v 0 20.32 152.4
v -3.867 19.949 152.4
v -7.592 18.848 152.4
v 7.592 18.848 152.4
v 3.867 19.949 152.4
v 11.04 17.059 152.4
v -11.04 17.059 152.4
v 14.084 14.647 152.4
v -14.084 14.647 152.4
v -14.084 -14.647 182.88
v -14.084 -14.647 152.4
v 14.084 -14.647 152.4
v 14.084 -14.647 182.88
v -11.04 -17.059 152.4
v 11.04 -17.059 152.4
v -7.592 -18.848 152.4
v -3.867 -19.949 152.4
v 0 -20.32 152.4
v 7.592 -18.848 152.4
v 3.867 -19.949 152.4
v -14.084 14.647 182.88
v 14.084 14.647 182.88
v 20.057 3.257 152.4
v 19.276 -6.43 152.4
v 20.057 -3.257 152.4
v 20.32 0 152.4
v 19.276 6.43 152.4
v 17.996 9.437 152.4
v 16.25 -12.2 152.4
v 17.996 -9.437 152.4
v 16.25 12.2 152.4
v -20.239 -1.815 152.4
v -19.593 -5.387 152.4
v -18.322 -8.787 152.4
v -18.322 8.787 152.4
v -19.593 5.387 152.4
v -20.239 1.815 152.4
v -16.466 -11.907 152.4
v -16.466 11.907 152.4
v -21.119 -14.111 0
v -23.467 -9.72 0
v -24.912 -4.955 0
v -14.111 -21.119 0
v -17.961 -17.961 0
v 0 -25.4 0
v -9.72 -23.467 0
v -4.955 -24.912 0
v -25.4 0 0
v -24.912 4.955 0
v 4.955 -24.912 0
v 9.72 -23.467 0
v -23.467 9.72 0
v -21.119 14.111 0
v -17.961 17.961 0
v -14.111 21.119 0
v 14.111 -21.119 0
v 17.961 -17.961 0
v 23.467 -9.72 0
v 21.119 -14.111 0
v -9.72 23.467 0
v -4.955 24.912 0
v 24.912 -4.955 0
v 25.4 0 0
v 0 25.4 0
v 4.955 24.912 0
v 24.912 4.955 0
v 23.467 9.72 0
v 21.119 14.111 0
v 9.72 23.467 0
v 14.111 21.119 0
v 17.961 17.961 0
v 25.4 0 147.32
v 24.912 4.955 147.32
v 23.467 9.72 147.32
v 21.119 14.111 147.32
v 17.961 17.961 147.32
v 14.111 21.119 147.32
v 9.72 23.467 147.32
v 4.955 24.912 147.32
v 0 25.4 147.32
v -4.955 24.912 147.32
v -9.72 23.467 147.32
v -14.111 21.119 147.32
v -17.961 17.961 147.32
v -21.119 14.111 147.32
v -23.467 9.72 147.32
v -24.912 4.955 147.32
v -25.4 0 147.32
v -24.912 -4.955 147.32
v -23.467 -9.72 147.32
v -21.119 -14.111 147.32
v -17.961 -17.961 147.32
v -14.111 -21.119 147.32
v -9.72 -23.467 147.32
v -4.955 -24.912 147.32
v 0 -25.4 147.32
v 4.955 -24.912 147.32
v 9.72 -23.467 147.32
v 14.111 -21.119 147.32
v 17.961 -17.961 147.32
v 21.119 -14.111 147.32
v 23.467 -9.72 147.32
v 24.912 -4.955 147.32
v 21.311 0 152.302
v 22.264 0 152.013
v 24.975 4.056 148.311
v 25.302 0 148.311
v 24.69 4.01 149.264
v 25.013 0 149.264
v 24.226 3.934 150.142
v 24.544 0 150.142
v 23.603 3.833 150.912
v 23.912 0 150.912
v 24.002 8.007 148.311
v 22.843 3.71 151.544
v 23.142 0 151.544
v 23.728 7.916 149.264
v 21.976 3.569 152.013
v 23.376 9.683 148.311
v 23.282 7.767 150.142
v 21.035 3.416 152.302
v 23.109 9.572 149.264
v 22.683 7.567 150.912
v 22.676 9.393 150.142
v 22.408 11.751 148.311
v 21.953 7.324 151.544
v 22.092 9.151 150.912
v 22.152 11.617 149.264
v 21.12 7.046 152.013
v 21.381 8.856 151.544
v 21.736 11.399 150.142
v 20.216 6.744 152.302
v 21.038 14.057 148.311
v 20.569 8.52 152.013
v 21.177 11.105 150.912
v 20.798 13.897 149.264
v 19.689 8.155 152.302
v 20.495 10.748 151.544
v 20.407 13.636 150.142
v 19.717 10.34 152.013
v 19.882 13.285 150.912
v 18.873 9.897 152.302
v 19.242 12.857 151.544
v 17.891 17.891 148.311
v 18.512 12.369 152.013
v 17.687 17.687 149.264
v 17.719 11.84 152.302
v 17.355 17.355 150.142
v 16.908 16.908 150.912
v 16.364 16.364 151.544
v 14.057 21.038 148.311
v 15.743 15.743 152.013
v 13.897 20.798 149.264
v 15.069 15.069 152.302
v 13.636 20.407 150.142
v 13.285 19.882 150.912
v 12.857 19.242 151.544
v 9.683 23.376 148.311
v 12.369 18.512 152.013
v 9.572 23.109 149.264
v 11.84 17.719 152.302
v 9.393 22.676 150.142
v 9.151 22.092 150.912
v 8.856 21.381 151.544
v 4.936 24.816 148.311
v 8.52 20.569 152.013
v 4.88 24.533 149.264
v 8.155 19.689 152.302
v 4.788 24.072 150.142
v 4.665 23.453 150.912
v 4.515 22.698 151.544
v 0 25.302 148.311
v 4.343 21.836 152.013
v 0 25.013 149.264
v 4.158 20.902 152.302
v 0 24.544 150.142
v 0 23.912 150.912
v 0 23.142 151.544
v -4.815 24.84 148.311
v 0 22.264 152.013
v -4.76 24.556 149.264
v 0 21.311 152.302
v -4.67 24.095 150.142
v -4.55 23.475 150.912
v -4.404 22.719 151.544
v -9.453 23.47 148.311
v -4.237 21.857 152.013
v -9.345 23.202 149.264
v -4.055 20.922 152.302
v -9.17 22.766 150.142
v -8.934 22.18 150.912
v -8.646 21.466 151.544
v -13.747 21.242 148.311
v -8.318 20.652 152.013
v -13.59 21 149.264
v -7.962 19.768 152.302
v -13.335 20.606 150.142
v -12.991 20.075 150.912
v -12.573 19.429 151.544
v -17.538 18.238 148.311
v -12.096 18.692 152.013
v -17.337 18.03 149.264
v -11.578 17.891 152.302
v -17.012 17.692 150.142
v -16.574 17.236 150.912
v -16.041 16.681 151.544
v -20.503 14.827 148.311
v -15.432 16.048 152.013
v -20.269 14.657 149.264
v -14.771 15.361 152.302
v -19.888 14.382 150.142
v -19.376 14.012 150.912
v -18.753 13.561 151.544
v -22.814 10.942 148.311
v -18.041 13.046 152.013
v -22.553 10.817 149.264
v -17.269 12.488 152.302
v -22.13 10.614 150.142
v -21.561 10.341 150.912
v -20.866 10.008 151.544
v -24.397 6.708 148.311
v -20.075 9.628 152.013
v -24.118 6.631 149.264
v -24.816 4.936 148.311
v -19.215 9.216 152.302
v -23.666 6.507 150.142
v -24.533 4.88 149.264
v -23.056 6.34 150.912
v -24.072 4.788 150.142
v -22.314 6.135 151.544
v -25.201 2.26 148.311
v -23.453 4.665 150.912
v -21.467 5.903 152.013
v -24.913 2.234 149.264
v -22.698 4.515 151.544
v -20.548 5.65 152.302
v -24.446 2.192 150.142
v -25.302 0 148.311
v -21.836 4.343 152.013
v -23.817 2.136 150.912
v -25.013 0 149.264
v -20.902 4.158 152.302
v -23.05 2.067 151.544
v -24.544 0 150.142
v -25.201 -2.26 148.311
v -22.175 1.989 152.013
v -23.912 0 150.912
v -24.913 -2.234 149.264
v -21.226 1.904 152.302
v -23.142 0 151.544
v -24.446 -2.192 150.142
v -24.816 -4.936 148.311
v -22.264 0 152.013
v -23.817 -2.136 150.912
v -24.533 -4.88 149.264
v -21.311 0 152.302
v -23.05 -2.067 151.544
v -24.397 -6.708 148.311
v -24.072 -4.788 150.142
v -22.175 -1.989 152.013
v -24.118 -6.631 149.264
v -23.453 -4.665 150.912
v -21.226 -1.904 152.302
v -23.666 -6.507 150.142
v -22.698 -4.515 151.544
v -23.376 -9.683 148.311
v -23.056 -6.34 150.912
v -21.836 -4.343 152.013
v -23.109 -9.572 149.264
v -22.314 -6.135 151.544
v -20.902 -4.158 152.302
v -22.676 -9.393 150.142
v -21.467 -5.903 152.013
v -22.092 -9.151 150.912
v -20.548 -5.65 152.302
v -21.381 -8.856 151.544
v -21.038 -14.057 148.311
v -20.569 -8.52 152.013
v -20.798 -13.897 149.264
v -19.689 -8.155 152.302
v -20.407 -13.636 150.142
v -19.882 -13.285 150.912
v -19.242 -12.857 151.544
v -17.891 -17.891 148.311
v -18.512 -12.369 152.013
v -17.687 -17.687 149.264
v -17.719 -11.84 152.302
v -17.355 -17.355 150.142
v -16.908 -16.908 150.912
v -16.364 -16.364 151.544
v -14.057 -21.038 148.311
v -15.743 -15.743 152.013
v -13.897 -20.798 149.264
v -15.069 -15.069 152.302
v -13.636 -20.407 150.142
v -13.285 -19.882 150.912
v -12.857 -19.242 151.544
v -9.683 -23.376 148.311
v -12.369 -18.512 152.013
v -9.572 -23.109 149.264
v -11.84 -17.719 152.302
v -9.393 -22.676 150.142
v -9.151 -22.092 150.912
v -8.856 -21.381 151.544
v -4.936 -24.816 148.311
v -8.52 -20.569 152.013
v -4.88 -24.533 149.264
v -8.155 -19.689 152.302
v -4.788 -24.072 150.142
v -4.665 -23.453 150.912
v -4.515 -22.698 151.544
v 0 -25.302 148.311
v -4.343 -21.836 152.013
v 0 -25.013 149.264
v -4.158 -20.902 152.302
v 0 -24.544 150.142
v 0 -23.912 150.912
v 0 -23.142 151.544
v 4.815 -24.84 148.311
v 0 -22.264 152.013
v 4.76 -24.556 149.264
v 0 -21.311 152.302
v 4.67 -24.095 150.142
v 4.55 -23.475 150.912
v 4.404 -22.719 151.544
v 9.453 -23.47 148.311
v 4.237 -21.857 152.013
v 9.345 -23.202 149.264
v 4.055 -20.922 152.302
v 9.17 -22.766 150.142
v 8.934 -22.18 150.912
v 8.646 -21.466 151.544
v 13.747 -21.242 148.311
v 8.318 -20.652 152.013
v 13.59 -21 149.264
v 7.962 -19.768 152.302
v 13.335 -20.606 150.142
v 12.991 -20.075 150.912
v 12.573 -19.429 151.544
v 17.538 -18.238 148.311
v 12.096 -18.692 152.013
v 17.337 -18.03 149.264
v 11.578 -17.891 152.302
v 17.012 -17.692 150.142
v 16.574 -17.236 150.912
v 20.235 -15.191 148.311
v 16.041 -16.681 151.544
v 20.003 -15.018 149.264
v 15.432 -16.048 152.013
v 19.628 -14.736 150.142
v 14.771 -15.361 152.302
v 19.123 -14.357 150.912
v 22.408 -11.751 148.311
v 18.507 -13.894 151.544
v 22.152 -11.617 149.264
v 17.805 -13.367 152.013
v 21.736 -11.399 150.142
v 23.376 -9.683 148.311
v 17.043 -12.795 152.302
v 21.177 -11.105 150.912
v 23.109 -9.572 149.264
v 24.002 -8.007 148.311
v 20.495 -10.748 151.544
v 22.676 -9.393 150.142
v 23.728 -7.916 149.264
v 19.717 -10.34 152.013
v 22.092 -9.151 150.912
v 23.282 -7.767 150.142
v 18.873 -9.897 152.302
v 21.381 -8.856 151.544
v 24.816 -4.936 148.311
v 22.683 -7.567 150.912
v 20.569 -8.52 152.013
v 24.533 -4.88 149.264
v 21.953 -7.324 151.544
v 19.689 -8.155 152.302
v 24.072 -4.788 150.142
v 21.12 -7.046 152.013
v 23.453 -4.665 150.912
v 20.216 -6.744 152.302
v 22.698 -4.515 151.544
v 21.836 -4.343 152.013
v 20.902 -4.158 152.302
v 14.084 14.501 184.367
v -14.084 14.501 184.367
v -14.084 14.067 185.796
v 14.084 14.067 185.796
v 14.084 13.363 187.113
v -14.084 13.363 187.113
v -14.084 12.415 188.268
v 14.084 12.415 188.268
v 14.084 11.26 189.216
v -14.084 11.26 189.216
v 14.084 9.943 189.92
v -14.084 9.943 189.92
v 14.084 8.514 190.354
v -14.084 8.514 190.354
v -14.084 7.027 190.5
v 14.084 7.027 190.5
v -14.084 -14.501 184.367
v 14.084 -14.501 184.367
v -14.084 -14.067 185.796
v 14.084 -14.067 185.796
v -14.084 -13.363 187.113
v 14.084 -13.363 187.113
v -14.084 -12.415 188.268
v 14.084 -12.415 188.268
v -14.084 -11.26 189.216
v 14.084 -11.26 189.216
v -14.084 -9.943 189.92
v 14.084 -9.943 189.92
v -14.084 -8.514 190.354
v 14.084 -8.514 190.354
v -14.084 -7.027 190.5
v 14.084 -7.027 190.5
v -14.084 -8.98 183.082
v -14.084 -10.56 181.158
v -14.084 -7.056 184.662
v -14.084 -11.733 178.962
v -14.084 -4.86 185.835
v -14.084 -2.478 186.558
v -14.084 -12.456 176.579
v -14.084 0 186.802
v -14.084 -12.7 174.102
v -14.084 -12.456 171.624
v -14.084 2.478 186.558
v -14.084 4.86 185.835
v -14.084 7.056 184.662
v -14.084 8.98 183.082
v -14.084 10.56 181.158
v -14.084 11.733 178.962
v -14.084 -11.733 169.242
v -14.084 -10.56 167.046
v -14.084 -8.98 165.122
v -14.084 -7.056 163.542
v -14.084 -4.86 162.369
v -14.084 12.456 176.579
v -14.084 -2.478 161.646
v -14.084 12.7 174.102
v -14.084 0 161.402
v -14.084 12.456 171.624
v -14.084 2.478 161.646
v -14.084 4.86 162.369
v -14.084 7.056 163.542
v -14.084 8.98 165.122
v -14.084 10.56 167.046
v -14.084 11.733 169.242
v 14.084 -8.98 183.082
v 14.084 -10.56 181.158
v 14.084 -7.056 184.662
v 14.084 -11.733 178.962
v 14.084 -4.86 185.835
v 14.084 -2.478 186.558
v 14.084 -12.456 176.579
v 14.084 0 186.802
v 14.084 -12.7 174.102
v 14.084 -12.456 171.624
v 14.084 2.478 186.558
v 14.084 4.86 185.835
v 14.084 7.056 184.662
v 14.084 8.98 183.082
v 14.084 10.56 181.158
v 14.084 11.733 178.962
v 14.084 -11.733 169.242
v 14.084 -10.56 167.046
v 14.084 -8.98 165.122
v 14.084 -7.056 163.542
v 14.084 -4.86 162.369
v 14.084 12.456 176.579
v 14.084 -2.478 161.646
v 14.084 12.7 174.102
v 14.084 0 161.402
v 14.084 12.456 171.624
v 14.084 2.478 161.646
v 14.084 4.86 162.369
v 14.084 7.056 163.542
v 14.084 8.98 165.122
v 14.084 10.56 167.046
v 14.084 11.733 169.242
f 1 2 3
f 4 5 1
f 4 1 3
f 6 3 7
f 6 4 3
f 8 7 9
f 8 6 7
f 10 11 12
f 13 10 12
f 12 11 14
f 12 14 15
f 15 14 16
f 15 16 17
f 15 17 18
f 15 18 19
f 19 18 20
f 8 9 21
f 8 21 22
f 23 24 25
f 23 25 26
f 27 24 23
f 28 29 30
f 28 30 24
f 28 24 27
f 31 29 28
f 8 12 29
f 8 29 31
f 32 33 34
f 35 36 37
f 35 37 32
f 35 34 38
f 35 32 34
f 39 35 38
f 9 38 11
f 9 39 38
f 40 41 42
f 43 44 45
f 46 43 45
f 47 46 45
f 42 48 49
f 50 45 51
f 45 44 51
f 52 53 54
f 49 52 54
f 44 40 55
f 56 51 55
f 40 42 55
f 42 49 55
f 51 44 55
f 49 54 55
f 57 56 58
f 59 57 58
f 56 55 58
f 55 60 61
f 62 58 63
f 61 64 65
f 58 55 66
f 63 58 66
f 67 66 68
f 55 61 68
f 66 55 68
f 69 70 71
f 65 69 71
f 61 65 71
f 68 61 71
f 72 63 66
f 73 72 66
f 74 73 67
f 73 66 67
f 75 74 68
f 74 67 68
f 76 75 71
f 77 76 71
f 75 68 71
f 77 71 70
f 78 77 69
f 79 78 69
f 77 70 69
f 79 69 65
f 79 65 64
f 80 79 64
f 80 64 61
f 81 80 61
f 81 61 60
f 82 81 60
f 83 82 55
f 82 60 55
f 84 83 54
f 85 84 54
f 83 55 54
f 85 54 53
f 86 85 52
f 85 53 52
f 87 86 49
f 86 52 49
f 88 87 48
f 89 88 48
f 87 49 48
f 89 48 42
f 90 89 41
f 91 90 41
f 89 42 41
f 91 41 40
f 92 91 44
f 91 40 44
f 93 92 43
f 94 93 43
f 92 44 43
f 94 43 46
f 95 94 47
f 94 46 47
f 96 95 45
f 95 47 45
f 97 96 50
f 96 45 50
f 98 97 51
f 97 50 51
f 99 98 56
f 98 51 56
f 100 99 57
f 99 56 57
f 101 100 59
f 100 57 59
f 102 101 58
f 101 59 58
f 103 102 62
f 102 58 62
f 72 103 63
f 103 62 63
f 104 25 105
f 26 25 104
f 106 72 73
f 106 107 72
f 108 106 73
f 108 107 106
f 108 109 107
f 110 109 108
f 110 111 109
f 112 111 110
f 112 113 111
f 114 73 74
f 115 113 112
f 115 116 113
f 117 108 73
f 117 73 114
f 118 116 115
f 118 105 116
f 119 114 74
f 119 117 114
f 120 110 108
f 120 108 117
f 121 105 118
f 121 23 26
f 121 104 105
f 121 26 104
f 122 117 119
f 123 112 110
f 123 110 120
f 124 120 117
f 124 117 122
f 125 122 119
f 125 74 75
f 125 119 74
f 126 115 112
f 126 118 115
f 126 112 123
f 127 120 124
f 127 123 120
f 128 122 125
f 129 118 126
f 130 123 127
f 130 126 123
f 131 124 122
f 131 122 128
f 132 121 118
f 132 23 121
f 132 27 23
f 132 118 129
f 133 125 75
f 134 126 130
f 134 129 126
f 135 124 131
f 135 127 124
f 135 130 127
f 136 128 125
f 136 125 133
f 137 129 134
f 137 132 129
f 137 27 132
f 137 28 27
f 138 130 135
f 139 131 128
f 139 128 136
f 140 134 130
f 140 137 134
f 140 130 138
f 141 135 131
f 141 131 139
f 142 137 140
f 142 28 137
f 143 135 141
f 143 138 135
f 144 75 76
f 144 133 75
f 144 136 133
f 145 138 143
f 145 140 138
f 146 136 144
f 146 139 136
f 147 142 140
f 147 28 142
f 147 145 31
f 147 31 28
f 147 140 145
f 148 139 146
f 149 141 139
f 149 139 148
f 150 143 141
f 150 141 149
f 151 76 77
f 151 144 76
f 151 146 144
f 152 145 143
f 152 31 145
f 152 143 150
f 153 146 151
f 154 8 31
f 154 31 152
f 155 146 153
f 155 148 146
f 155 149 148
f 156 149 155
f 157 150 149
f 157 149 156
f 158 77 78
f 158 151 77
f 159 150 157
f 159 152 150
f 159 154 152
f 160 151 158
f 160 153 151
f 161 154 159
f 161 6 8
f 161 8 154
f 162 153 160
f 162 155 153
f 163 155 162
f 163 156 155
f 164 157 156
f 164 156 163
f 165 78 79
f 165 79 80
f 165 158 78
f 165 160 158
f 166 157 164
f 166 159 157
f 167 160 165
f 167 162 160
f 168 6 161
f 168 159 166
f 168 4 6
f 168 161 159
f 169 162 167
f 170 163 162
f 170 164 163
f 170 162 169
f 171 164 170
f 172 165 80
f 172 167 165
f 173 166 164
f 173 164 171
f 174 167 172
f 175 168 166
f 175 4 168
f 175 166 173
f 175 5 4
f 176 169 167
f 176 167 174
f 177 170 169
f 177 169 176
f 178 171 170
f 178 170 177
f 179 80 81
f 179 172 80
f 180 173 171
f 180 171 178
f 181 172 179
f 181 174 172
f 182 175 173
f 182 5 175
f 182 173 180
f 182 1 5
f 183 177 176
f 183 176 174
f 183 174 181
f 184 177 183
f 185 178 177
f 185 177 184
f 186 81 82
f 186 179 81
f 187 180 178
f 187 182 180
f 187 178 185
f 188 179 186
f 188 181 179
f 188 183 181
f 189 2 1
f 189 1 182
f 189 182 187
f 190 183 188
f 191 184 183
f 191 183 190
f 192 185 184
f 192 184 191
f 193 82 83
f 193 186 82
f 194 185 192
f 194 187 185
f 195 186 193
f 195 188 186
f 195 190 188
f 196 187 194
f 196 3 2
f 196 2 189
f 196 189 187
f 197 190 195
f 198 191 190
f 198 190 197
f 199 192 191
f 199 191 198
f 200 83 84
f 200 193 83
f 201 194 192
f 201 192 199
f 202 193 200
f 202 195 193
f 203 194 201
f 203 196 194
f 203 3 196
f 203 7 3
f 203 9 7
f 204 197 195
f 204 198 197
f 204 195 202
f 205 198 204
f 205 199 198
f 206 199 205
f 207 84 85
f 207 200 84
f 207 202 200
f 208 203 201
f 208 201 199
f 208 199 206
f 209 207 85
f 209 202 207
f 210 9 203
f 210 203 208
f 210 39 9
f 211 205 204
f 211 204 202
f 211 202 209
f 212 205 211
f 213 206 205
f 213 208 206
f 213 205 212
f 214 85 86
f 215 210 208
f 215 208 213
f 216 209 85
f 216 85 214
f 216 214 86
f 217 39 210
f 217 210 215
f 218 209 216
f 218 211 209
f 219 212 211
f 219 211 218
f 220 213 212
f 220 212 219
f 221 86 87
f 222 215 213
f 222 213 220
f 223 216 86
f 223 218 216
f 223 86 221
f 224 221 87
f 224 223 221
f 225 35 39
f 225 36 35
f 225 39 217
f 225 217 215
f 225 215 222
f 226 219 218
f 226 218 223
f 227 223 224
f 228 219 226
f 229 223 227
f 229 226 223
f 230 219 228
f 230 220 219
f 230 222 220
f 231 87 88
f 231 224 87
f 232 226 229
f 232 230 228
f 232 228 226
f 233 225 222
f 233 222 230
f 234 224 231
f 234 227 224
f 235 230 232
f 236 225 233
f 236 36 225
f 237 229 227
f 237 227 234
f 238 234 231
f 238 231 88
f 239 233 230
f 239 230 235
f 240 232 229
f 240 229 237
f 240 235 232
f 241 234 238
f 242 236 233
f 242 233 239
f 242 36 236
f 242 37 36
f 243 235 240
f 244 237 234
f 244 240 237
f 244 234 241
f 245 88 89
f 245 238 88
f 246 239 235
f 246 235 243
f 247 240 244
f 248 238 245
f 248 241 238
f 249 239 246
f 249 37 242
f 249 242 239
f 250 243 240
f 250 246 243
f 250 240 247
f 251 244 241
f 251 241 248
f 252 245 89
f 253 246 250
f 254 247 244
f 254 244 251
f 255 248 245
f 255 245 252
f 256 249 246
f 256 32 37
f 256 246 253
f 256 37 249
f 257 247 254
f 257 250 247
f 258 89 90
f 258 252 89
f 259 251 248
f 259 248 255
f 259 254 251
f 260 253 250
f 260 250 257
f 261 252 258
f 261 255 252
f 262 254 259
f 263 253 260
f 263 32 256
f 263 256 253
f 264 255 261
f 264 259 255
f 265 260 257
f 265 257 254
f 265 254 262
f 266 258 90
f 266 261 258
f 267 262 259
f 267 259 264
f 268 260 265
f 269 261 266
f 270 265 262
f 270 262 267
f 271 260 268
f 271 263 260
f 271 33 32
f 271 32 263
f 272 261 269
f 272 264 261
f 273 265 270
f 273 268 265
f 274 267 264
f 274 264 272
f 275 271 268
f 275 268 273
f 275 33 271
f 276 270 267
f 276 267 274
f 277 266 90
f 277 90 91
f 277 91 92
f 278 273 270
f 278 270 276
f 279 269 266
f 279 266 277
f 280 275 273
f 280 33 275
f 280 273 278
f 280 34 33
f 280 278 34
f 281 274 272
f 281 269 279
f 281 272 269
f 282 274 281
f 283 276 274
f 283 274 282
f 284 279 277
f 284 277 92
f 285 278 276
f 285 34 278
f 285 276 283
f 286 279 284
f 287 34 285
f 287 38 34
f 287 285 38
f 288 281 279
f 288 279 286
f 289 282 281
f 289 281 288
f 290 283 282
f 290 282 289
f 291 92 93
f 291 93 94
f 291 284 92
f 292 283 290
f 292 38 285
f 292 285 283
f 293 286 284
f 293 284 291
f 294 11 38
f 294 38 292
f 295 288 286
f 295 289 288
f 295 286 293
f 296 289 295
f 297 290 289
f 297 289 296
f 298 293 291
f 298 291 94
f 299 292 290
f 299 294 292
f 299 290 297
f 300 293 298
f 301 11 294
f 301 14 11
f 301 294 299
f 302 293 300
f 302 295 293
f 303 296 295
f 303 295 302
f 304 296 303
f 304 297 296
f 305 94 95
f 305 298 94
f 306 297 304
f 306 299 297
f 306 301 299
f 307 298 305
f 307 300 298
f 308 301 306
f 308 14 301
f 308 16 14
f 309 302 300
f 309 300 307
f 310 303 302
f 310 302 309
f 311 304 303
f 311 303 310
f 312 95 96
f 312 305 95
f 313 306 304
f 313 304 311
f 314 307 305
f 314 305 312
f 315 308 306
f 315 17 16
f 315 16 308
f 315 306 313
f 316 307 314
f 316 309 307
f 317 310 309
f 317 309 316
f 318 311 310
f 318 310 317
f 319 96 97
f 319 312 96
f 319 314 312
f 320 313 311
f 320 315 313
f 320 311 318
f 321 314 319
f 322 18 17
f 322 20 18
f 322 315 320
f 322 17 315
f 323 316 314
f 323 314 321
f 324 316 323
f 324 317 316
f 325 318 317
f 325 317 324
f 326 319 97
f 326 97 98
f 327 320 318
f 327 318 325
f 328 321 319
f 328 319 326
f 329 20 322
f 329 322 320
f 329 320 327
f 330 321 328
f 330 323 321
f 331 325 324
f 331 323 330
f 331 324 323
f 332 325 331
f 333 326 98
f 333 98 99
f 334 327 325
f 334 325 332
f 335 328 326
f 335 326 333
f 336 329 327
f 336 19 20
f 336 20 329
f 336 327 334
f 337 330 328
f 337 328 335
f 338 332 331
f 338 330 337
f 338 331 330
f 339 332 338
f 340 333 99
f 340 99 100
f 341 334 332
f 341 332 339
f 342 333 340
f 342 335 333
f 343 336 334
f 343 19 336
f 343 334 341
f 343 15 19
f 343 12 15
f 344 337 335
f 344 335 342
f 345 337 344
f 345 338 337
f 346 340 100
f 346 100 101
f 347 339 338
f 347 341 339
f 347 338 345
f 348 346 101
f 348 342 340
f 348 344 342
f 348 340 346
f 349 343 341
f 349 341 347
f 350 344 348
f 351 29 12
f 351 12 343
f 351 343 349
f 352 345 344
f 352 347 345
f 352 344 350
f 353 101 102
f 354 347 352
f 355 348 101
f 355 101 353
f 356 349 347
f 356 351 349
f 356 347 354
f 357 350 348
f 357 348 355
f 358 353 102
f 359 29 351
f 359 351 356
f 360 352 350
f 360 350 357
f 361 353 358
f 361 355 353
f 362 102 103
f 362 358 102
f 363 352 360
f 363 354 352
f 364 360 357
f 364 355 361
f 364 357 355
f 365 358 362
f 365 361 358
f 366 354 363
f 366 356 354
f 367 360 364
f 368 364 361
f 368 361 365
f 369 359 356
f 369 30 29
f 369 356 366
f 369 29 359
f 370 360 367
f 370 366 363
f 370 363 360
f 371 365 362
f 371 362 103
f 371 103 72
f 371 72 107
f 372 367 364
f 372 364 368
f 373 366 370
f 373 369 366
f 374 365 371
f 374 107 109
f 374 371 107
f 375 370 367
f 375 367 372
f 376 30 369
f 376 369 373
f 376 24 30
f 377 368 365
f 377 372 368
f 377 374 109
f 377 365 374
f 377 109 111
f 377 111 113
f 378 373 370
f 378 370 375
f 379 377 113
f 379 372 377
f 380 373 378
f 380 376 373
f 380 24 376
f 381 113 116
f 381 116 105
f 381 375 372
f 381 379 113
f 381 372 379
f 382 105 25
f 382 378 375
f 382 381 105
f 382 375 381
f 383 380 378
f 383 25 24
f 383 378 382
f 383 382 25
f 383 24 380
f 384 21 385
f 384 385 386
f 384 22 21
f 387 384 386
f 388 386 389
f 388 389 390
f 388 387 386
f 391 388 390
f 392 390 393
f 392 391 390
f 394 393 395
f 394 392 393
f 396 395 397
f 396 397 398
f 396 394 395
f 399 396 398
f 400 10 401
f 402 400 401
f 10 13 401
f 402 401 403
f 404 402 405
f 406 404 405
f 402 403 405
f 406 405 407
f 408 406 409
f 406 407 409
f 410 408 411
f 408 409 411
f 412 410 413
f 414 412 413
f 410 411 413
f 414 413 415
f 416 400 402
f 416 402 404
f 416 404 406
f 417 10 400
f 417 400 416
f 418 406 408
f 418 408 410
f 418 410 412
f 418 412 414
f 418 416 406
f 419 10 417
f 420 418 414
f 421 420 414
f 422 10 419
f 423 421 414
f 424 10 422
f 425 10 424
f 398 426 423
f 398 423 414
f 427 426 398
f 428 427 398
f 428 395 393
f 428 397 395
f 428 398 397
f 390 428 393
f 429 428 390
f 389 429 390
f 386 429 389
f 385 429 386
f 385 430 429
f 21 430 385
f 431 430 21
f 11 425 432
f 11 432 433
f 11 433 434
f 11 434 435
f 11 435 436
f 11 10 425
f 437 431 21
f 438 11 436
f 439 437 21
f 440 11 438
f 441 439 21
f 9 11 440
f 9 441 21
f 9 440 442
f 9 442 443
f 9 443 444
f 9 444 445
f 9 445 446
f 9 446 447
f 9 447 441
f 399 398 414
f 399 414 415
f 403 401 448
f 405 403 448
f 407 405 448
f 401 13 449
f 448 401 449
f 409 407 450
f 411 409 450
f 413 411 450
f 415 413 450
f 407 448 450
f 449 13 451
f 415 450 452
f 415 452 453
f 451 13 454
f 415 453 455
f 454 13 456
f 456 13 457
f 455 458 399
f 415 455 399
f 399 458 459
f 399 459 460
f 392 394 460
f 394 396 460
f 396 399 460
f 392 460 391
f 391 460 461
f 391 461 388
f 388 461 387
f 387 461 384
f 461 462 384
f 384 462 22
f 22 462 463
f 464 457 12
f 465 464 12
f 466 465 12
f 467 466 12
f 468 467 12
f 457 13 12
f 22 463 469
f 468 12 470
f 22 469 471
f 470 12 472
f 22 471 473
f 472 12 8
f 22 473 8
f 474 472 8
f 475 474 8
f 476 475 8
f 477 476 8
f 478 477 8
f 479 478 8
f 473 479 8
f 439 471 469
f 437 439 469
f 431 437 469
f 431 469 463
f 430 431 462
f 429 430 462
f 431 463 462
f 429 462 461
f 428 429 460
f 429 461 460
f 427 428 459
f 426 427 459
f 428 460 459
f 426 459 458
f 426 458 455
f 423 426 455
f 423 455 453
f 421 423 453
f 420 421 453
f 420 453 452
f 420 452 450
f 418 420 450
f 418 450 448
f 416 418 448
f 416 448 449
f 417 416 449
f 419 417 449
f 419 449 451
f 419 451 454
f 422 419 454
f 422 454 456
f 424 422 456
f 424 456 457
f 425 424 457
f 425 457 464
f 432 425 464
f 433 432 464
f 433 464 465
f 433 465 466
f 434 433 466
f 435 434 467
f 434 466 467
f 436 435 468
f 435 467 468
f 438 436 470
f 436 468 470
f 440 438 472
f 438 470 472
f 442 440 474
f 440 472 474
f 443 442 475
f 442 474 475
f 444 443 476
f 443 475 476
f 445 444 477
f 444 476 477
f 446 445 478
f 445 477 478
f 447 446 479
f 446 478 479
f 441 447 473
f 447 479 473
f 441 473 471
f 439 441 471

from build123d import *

# Parameters (mm, degrees)
F0_R     = 25.4
F1_DEPTH = 152.4
F2_R     = 5.08
F3_W     = 28.1686
F3_H     = 29.29402
F4_DEPTH = 38.1
F6_R     = 7.62
F5_R     = 12.7
F7_DEPTH = 39.4853


with BuildPart() as f1:
    # F0 (on Top) → F1 (new body)
    with BuildSketch(Plane.XY):
        Circle(F0_R)
    extrude(amount=F1_DEPTH)

    # F2
    f2_edges = [f1.edges().sort_by_distance(p)[0] for p in [
        (-25.4, 0, 152.4),
    ]]
    fillet(f2_edges, radius=F2_R)

    # F3 (on face) → F4 (join)
    with BuildSketch(Plane.XY.offset(152.4)):
        Rectangle(F3_W, F3_H)
    extrude(amount=F4_DEPTH)

    # F6
    f6_edges = [f1.edges().sort_by_distance(p)[0] for p in [
        (0, -14.64701, 190.5),
        (0, 14.64701, 190.5),
    ]]
    fillet(f6_edges, radius=F6_R)

    # F5 (on face) → F7 (cut, through all)
    with BuildSketch(Plane.YZ.offset(14.0843)):
        with Locations((0, 174.101845)):
            Circle(F5_R)
    extrude(amount=-F7_DEPTH, mode=Mode.SUBTRACT)


solid = f1.part
